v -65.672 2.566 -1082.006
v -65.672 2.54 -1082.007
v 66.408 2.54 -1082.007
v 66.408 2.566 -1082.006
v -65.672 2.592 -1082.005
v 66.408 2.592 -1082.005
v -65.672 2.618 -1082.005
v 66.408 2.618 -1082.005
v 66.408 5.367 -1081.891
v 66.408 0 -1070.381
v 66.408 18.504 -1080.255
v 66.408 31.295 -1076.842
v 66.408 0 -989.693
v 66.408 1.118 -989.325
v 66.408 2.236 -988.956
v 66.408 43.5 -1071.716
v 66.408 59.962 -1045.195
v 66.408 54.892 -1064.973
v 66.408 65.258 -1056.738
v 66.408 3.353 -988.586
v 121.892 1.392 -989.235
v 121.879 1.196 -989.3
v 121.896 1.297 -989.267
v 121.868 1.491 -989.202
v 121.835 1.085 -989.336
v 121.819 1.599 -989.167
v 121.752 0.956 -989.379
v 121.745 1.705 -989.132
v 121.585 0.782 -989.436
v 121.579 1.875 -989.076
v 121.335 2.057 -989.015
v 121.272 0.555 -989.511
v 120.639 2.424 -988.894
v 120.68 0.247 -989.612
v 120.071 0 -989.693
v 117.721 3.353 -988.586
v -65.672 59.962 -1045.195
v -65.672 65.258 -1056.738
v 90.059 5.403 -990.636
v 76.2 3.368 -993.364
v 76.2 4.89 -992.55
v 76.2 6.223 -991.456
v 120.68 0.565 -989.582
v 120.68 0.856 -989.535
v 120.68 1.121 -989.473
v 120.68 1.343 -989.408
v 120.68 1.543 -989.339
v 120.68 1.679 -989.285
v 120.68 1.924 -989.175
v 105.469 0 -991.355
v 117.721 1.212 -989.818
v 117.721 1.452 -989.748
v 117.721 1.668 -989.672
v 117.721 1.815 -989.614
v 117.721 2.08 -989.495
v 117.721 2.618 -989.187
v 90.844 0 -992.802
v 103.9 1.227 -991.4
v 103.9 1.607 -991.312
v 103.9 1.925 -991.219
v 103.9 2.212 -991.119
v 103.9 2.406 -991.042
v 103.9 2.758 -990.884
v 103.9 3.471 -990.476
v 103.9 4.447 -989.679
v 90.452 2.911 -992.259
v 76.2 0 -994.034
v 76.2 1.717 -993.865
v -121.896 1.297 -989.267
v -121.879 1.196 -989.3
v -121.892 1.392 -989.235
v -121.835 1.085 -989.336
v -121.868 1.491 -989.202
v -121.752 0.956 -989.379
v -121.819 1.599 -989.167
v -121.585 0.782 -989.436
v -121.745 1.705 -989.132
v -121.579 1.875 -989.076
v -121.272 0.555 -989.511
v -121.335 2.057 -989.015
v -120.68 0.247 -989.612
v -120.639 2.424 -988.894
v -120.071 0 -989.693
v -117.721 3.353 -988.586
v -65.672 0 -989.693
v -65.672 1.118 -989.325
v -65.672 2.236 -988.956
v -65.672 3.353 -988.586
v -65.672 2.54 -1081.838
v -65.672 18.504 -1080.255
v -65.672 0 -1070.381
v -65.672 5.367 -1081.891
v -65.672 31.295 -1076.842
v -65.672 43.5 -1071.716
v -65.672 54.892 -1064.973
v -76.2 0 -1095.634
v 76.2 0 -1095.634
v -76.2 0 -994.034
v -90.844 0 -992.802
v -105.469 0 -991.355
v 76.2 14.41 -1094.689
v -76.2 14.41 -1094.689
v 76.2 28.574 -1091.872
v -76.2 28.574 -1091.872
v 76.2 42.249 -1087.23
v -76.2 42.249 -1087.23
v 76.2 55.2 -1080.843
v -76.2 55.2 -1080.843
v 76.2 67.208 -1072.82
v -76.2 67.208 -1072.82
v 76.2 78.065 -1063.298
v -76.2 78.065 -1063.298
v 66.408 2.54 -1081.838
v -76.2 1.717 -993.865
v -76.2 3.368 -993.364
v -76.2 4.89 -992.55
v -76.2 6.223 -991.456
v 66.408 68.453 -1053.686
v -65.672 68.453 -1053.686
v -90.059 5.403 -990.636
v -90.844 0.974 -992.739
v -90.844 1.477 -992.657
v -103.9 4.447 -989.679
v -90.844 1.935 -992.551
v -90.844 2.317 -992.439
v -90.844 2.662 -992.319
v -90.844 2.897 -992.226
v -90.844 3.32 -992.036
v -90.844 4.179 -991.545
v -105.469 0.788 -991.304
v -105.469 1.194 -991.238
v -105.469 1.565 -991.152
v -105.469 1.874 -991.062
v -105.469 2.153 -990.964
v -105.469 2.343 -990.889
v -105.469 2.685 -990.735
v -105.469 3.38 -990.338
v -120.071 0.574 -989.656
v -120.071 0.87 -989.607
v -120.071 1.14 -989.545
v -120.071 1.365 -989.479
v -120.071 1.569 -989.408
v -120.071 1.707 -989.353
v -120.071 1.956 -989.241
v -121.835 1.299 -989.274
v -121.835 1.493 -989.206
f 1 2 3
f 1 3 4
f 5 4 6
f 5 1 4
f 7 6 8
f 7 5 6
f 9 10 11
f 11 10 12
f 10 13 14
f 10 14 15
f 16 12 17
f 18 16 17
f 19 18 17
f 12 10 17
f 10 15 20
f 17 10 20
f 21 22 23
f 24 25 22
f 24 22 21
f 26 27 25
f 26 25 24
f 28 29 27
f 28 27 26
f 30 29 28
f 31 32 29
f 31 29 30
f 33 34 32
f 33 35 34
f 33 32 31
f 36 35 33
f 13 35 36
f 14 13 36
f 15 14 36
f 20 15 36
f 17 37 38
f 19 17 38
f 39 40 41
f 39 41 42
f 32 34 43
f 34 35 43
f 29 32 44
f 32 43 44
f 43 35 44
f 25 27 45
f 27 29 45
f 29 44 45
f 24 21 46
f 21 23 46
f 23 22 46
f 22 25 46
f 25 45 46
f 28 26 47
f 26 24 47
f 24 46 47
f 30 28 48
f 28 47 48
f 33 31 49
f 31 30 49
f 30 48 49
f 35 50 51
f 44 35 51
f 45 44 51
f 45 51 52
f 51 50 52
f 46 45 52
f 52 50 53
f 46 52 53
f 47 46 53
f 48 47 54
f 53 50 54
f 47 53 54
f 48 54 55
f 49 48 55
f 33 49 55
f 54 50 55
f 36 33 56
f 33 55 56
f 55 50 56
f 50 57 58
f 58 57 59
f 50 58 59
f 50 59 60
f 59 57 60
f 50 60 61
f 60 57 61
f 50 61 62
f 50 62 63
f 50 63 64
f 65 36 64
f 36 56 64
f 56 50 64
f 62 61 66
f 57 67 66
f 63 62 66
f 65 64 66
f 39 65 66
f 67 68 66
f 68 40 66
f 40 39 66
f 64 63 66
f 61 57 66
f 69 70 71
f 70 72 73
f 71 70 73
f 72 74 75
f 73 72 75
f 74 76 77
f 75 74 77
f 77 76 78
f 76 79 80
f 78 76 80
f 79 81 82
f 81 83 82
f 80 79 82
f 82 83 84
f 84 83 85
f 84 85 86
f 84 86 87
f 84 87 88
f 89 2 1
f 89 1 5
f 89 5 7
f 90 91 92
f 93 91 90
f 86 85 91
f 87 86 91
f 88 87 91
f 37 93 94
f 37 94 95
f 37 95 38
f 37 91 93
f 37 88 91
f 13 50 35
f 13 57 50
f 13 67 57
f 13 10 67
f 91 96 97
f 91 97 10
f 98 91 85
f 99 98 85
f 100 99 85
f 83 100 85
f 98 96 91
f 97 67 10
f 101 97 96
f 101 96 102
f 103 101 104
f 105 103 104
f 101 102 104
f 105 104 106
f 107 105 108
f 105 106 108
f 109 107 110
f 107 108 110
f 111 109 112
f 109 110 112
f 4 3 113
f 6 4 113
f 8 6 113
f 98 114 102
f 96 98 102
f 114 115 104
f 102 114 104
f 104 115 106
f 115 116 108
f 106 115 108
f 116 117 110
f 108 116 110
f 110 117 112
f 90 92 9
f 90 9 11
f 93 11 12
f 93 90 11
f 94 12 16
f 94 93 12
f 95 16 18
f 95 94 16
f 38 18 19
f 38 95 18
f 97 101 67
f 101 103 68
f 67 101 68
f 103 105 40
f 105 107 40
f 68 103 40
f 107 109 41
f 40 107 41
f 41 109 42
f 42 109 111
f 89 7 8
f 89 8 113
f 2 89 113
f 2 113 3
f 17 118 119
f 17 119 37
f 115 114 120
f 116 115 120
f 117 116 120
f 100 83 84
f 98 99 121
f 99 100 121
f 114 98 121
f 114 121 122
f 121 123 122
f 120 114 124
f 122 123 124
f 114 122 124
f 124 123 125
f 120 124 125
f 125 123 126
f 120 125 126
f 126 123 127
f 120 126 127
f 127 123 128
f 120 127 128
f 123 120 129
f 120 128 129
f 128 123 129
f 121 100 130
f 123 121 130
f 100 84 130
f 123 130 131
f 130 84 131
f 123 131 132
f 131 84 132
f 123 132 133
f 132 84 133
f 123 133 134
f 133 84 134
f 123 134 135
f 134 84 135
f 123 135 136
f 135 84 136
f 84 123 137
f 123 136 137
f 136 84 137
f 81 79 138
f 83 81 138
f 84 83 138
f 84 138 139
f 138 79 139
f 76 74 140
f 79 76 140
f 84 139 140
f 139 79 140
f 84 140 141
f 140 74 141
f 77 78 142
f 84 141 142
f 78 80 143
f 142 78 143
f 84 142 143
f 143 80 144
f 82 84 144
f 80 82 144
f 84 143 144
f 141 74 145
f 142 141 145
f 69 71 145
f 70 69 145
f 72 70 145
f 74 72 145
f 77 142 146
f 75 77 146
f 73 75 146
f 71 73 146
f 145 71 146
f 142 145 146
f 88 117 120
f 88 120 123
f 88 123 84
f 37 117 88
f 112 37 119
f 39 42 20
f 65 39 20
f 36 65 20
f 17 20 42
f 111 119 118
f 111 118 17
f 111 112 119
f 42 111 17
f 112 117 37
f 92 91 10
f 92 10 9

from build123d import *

# Parameters (mm, degrees)
REVOLVE1_ANGLE            = 45
CUT_REVOLVE_THIN3_START   = -65.672494398
CUT_REVOLVE_THIN3_DEPTH   = 132.08
CUT_REVOLVE_THIN3_START_2 = 59.247024
CUT_REVOLVE_THIN3_2_DEPTH = 7.160481602
EXTRUDE_THIN1_DEPTH       = 132.08
BOSS_EXTRUDE1_START       = 132.08
BOSS_EXTRUDE1_DEPTH       = 132.08
SKETCH12_R                = 990.316340453
CUT_EXTRUDE1_DEPTH        = 132.08
SKETCH14_W                = 3.086900102
SKETCH14_H                = 1.742063617
CUT_EXTRUDE5_DEPTH        = 2.54
SKETCH16_R                = 990.316340453
CUT_EXTRUDE6_DEPTH        = 351.028


# Read off the part's stored shape, not the designer's step: Cut-Revolve-Thin3
with BuildPart() as part:
    # Sketch1 → Revolve1 (revolve)
    with BuildSketch(Plane(origin=(0, 0, 0), x_dir=(1, 0, 0), z_dir=(0, 1, 0))):
        with BuildLine():
            Line((76.2, 994.033632479), (76.2, 1095.633632479))
            Line((76.2, 1095.633632479), (-76.2, 1095.633632479))
            Line((-76.2, 1095.633632479), (-76.2, 994.033632479))
            ThreePointArc((-76.2, 994.033632479), (-114.384675321, 990.366320384), (-152.4, 985.232735195))
            Line((-152.4, 985.232735195), (-102.9796946, 985.232735195))
            ThreePointArc((-102.9796946, 985.232735195), (0, 990.6), (102.9796946, 985.232735195))
            Line((102.9796946, 985.232735195), (152.4, 985.232735195))
            ThreePointArc((152.4, 985.232735195), (114.384675321, 990.366320384), (76.2, 994.033632479))
        make_face()
    revolve(axis=Axis((-102.9796946, 0, -985.232735195), (1, 0, 0)), revolution_arc=REVOLVE1_ANGLE)

    # Cut-Revolve-Thin3 outline → Cut-Revolve-Thin3 (cut)
    with BuildSketch(Plane.YZ.offset(CUT_REVOLVE_THIN3_START)):
        with BuildLine():
            ThreePointArc((0, -1082.04), (37.046536374, -1074.670985747), (68.453073412, -1053.685808607))
            Line((68.453073412, -1053.685808607), (2.371248163, -987.603983358))
            ThreePointArc((2.371248163, -987.603983358), (1.283310258, -988.330920225), (0, -988.586186506))
            Line((0, -988.586186506), (0, -1082.04))
        make_face()
    extrude(amount=CUT_REVOLVE_THIN3_DEPTH, mode=Mode.SUBTRACT)

    # Cut-Revolve-Thin3 2 outline → Cut-Revolve-Thin3 2 (cut)
    with BuildSketch(Plane.YZ.offset(CUT_REVOLVE_THIN3_START_2)):
        with BuildLine():
            ThreePointArc((0, -988.586186506), (1.283310258, -988.330920225), (2.371248163, -987.603983358))
            Line((2.371248163, -987.603983358), (2.337863382, -987.570598578))
            ThreePointArc((2.337863382, -987.570598578), (1.265242545, -988.287300908), (0, -988.538973298))
            Line((0, -988.538973298), (0, -988.586186506))
        make_face()
    extrude(amount=CUT_REVOLVE_THIN3_2_DEPTH, mode=Mode.SUBTRACT)

    # Sketch5 → Extrude-Thin1 (add)
    with BuildSketch(Plane(origin=(-65.672494398, 0, 0), x_dir=(0, 0, -1), z_dir=(1, 0, 0))):
        Polygon((1082.04, 0), (1070.380989237, 0), (1081.891098133, 5.367251924), (1082.964548518, 3.065230145), (1081.838188837, 2.54), (1082.04, 2.54), align=None)
    extrude(amount=EXTRUDE_THIN1_DEPTH)

    # Sketch11 → Boss-Extrude1 (add)
    with BuildSketch(Plane.ZY.offset(-66.407505602).offset(BOSS_EXTRUDE1_START)):
        with BuildLine():
            Line((-1053.685808607, 68.453073412), (-1045.195024303, 59.962289107))
            Line((-1045.195024303, 59.962289107), (-1056.738187334, 65.258078683))
            ThreePointArc((-1056.738187334, 65.258078683), (-1055.230229553, 66.872993821), (-1053.685808607, 68.453073412))
        make_face()
    extrude(amount=-BOSS_EXTRUDE1_DEPTH)

    # Sketch12 → Cut-Extrude1 (cut)
    with BuildSketch(Plane(origin=(-65.672494398, 0, 0), x_dir=(0, 0, -1), z_dir=(1, 0, 0))):
        with Locations((48.724048718, -308.713234064)):
            Circle(SKETCH12_R)
    extrude(amount=-CUT_EXTRUDE1_DEPTH, mode=Mode.SUBTRACT)


with BuildPart() as cut_extrude1_piece_1:
    # of the separate pieces the step leaves, piece 1, a body of its own (cut_extrude1_pieces)
    add(part.part.solids().sort_by_distance((152.4, 0, -985.232735195))[0])

    # Sketch16 → Cut-Extrude6 (cut)
    with BuildSketch(Plane(origin=(-65.672494398, 0, 0), x_dir=(0, 0, -1), z_dir=(1, 0, 0))):
        with Locations((48.724048718, -308.713234064)):
            Circle(SKETCH16_R)
    extrude(amount=CUT_EXTRUDE6_DEPTH, mode=Mode.SUBTRACT)


with BuildPart() as cut_extrude1_piece_2:
    # of the separate pieces the step leaves, piece 2, a body of its own (cut_extrude1_pieces)
    add(part.part.solids().sort_by_distance((-65.672494398, 0, -988.586186506))[0])

    # Sketch14 → Cut-Extrude5 (cut)
    with BuildSketch(Plane.XZ):
        with Locations((-64.129044347, -987.715154698)):
            Rectangle(SKETCH14_W, SKETCH14_H)
    extrude(amount=-CUT_EXTRUDE5_DEPTH, mode=Mode.SUBTRACT)


solid = cut_extrude1_piece_1.part
